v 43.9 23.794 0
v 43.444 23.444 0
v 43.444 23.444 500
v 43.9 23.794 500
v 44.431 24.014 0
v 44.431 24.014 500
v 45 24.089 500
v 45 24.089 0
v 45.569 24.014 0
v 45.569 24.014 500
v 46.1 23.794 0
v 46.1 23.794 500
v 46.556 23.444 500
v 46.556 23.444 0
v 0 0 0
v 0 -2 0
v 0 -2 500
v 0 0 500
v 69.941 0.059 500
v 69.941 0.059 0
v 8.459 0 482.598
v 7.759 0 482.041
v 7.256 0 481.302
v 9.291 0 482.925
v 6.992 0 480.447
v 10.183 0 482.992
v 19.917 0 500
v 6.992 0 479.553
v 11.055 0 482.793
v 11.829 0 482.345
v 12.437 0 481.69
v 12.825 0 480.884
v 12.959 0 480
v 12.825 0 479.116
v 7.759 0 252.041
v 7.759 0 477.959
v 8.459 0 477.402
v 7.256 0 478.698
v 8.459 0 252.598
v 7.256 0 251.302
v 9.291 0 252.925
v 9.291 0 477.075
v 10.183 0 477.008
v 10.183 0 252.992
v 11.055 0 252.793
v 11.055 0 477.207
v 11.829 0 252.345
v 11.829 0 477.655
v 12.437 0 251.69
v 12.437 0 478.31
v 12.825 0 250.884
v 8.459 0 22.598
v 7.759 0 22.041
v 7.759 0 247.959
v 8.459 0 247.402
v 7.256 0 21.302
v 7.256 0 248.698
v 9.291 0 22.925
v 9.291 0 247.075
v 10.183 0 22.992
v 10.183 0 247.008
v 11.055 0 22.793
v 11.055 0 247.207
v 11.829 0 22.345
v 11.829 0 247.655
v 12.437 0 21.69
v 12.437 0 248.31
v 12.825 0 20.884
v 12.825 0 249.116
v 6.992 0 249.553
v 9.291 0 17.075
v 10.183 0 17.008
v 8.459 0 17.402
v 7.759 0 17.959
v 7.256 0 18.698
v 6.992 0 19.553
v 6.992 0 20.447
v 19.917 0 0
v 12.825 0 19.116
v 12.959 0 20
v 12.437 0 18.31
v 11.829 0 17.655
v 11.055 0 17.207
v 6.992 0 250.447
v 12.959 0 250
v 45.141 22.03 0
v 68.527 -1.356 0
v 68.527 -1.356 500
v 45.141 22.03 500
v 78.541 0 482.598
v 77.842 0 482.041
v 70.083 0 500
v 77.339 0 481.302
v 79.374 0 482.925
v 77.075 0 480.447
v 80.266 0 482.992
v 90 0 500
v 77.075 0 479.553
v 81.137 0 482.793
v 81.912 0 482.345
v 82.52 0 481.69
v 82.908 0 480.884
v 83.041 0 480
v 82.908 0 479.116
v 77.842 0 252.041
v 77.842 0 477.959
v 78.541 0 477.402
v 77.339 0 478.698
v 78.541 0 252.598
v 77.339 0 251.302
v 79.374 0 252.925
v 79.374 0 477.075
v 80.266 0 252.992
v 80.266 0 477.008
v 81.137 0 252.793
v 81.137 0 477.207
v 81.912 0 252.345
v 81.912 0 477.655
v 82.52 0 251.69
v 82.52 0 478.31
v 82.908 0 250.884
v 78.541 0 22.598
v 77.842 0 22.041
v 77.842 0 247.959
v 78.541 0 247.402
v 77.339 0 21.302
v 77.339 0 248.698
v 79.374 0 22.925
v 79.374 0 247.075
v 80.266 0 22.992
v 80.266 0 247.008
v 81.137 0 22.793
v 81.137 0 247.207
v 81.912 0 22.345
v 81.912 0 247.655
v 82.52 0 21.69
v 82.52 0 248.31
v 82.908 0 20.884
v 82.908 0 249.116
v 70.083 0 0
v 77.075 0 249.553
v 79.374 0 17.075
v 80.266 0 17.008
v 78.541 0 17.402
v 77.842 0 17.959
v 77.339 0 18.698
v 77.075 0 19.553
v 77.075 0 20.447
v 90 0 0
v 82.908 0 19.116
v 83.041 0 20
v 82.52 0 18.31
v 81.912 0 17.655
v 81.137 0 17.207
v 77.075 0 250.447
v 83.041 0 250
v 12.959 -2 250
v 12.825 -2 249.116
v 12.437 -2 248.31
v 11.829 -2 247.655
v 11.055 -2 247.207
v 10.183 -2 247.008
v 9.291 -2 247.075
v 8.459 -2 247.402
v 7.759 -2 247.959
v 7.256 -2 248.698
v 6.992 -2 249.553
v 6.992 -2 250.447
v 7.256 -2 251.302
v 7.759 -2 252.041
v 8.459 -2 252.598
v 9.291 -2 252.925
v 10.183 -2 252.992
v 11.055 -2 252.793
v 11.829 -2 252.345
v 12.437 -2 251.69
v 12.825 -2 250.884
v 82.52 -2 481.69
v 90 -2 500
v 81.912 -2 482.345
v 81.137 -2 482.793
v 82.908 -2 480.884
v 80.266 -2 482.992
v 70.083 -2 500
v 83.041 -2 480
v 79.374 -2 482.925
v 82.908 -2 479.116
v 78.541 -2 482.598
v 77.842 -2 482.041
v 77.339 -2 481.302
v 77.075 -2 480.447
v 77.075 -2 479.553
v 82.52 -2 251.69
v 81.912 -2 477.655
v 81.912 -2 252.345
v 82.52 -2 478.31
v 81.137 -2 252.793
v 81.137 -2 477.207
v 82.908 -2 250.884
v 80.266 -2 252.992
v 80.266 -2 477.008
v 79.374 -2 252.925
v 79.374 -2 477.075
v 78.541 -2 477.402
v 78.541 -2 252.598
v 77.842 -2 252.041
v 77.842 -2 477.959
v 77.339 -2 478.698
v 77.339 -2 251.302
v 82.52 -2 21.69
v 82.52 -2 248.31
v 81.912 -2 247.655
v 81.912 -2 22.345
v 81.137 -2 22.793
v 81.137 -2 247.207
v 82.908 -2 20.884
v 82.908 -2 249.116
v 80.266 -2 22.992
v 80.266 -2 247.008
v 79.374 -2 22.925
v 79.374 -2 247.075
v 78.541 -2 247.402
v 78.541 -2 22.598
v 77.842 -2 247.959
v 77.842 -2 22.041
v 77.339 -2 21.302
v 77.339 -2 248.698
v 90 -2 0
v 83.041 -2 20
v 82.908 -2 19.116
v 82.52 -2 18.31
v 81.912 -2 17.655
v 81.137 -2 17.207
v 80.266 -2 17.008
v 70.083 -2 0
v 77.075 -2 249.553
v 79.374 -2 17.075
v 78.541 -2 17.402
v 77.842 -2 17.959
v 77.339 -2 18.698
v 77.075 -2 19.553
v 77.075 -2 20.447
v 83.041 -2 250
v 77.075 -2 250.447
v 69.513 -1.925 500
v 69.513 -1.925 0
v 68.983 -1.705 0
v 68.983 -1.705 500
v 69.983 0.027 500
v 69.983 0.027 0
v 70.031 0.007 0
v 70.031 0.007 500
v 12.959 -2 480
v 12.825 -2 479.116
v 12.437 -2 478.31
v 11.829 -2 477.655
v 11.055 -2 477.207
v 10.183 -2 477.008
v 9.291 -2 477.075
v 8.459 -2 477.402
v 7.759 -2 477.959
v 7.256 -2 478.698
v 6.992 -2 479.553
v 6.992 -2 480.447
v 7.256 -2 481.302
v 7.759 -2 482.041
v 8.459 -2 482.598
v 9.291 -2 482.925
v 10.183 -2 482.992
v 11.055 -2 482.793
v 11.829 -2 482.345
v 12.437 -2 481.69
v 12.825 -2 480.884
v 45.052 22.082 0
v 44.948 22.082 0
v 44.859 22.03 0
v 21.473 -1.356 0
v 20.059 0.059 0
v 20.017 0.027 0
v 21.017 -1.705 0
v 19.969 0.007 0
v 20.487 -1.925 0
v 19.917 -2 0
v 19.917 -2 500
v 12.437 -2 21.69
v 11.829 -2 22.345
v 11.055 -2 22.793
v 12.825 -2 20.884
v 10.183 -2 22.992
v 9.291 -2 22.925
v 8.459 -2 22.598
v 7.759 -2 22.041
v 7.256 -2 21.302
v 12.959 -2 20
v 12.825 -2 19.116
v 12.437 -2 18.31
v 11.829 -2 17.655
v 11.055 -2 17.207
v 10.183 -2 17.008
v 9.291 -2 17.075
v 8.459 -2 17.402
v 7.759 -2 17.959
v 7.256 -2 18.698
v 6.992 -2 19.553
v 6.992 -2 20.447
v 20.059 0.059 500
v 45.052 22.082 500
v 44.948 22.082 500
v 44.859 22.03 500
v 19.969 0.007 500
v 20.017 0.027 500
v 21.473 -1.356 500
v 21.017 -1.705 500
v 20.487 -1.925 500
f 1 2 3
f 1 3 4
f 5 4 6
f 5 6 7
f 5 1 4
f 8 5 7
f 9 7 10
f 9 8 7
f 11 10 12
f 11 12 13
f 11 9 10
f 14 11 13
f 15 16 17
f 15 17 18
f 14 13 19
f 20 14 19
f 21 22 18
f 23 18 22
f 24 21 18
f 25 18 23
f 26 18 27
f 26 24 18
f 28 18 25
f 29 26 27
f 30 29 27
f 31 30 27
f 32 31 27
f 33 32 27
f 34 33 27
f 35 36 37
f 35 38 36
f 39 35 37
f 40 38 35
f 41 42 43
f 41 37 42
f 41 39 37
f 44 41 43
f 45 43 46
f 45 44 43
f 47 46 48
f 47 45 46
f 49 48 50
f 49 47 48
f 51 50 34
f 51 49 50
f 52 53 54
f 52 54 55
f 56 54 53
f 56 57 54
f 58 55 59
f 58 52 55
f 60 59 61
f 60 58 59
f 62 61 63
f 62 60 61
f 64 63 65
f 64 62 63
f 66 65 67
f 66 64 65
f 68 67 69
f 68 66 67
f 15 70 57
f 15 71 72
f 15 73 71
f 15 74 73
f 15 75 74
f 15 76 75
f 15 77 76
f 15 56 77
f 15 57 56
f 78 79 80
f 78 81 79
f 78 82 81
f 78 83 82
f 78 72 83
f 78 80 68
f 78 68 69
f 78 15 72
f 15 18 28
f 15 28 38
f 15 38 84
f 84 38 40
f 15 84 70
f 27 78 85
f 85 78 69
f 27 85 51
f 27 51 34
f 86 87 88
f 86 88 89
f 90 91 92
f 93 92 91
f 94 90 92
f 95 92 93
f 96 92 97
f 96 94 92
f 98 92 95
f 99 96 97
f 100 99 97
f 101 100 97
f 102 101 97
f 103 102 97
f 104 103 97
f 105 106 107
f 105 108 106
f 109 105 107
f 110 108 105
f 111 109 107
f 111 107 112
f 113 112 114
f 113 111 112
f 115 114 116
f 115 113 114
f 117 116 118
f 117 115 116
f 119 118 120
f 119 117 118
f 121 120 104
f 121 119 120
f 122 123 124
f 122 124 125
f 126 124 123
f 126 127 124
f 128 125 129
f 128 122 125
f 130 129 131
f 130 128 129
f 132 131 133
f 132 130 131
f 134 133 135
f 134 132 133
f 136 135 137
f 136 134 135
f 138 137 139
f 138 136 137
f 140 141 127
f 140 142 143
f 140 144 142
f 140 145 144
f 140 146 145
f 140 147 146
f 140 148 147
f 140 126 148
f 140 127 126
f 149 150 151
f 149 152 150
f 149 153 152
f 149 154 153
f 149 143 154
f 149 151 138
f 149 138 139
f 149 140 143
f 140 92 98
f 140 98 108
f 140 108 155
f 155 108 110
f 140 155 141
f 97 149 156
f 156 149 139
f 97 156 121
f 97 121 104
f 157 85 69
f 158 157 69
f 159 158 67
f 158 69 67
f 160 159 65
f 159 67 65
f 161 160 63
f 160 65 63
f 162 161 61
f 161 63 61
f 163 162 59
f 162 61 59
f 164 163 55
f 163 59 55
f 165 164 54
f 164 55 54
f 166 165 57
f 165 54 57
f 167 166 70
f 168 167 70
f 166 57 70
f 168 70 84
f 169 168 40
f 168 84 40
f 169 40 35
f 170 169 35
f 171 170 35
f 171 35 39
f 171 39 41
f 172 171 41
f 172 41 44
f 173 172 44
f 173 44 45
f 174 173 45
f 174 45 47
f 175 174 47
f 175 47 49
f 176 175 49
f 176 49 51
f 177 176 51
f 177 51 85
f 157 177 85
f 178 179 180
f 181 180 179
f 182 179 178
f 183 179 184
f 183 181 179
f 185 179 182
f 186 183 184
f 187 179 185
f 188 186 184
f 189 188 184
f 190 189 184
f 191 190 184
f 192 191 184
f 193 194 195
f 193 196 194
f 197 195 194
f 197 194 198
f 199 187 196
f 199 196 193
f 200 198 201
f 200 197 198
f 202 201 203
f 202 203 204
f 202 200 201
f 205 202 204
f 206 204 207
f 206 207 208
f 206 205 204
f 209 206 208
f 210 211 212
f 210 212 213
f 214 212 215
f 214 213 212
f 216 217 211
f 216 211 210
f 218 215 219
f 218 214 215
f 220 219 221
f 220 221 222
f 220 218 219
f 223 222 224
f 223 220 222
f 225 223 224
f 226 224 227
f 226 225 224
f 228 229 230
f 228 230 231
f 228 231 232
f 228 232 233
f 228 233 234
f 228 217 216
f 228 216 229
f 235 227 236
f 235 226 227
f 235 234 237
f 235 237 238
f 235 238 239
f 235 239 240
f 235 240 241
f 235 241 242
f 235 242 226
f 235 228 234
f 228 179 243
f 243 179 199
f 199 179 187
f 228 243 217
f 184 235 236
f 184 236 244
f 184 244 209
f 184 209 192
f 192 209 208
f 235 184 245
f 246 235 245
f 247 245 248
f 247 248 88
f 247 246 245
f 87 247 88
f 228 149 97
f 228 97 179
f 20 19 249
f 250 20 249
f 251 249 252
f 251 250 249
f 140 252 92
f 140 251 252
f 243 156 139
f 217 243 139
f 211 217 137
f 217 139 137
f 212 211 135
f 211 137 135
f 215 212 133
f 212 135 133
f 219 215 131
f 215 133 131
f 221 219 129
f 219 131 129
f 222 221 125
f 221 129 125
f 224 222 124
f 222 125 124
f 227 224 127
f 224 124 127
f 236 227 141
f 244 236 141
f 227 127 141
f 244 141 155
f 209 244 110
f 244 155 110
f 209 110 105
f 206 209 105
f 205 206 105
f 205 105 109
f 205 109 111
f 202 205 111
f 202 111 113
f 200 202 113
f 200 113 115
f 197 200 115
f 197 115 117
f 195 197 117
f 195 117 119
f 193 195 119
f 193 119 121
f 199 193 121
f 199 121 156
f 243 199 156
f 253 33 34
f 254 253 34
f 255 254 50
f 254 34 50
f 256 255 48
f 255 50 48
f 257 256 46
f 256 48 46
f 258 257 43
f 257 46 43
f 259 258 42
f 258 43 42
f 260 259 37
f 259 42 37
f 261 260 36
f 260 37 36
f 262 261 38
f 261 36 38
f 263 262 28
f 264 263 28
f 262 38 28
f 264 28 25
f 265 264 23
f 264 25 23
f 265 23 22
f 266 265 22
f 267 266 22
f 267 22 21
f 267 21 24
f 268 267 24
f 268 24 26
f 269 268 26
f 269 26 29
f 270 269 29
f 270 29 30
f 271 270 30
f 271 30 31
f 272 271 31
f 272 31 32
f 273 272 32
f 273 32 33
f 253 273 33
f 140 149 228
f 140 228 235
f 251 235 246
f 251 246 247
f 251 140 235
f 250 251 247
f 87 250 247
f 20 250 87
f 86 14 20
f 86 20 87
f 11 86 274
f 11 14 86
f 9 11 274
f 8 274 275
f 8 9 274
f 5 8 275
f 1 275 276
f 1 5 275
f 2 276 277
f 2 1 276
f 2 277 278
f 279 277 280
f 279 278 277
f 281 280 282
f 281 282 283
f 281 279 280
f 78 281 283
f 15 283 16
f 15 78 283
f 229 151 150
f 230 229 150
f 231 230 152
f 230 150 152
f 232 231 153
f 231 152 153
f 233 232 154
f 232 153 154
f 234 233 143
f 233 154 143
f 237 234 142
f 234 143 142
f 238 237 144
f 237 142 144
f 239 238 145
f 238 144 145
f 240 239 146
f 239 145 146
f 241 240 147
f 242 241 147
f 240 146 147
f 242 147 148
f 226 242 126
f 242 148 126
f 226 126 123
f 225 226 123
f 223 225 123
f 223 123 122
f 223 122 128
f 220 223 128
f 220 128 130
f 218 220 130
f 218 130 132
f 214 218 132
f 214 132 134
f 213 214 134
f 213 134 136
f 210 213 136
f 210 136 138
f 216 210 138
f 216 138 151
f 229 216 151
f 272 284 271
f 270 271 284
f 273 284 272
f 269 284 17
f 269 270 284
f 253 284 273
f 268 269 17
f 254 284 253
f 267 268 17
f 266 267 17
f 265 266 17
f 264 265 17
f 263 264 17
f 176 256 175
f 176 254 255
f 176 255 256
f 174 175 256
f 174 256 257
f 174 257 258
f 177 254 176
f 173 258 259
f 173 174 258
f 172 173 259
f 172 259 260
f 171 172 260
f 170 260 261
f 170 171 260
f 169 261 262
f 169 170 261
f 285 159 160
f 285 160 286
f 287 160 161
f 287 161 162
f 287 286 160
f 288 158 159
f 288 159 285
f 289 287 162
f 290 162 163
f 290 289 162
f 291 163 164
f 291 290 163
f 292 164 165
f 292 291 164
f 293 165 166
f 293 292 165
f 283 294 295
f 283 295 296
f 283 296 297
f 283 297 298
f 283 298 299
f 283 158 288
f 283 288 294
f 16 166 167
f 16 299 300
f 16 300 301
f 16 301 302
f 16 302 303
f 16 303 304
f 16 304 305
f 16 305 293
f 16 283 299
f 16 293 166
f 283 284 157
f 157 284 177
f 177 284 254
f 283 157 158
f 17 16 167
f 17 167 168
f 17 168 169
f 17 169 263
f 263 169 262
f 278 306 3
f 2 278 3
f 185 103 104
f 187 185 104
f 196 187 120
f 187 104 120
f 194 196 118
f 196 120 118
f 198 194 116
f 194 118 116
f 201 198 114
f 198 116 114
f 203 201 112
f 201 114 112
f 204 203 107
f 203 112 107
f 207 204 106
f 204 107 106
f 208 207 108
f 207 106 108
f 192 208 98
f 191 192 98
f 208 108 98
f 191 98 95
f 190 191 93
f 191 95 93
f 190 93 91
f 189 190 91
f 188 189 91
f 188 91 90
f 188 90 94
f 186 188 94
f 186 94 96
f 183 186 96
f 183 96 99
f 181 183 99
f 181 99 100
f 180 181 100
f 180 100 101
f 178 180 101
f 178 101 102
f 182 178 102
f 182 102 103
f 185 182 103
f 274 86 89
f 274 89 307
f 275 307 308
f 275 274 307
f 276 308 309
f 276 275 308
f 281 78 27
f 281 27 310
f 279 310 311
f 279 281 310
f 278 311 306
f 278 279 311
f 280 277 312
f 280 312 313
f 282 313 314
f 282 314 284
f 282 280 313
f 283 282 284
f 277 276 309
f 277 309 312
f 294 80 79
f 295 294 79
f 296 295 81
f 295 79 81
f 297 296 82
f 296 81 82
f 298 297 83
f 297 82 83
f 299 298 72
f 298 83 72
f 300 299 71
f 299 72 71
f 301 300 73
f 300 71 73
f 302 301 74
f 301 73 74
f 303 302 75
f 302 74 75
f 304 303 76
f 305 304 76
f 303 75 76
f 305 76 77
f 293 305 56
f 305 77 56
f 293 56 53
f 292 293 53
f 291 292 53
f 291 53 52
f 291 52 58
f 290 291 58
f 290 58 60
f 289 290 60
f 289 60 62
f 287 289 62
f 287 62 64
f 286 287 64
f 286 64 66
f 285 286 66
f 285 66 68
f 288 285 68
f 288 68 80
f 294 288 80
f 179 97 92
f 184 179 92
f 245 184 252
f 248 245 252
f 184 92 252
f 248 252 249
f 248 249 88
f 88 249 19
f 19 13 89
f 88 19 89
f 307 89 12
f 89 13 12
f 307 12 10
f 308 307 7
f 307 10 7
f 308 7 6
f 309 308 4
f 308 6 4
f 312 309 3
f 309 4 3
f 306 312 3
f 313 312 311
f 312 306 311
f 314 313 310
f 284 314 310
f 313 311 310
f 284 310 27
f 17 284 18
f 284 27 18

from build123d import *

# Parameters (mm, degrees)
EXTRUDE_1_DEPTH     = 500
CUT_EXTRUDE_1_REACH = 4
SKETCH_2_R          = 3


with BuildPart() as part:
    # 草图1 → 凸台-拉伸1 (new body)
    with BuildSketch(Plane.XY):
        with BuildLine():
            Line((0, 0), (19.917157288, 0))
            ThreePointArc((19.917157288, 0), (19.993693974, 0.015224093), (20.058578644, 0.058578644))
            Line((20.058578644, 0.058578644), (43.444365081, 23.444365081))
            ThreePointArc((43.444365081, 23.444365081), (45, 24.088730163), (46.555634919, 23.444365081))
            Line((46.555634919, 23.444365081), (69.941421356, 0.058578644))
            ThreePointArc((69.941421356, 0.058578644), (70.006306026, 0.015224093), (70.082842712, 0))
            Line((70.082842712, 0), (90, 0))
            Line((90, 0), (90, -2))
            Line((90, -2), (70.082842712, -2))
            ThreePointArc((70.082842712, -2), (69.240939161, -1.832534972), (68.527207794, -1.355634919))
            Line((68.527207794, -1.355634919), (45.141421356, 22.030151519))
            ThreePointArc((45.141421356, 22.030151519), (45, 22.088730163), (44.858578644, 22.030151519))
            Line((44.858578644, 22.030151519), (21.472792206, -1.355634919))
            ThreePointArc((21.472792206, -1.355634919), (20.759060839, -1.832534972), (19.917157288, -2))
            Line((19.917157288, -2), (0, -2))
            Line((0, -2), (0, 0))
        make_face()
    extrude(amount=EXTRUDE_1_DEPTH)

    # 草图2 → 切除-拉伸1 (cut, up to next)
    with BuildSketch(Plane(origin=(0, 0, 0), x_dir=(1, 0, 0), z_dir=(0, 1, 0)), mode=Mode.PRIVATE) as cut_extrude_1_sk1:
        with Locations((9.958578644, -20)):
            Circle(SKETCH_2_R)
    cut_extrude_1_tool1 = extrude(cut_extrude_1_sk1.sketch, amount=-CUT_EXTRUDE_1_REACH, mode=Mode.PRIVATE) & part.part
    add(cut_extrude_1_tool1.solids().sort_by_distance((9.958579, 0, 20))[0], mode=Mode.SUBTRACT)
    # 草图2 → 切除-拉伸1 (cut, up to next)
    with BuildSketch(Plane(origin=(0, 0, 0), x_dir=(1, 0, 0), z_dir=(0, 1, 0)), mode=Mode.PRIVATE) as cut_extrude_1_sk2:
        with Locations((80.041421356, -20)):
            Circle(SKETCH_2_R)
    cut_extrude_1_tool2 = extrude(cut_extrude_1_sk2.sketch, amount=-CUT_EXTRUDE_1_REACH, mode=Mode.PRIVATE) & part.part
    add(cut_extrude_1_tool2.solids().sort_by_distance((80.041421, 0, 20))[0], mode=Mode.SUBTRACT)
    # 草图2 → 切除-拉伸1 (cut, up to next)
    with BuildSketch(Plane(origin=(0, 0, 0), x_dir=(1, 0, 0), z_dir=(0, 1, 0)), mode=Mode.PRIVATE) as cut_extrude_1_sk3:
        with Locations((9.958578644, -250)):
            Circle(SKETCH_2_R)
    cut_extrude_1_tool3 = extrude(cut_extrude_1_sk3.sketch, amount=-CUT_EXTRUDE_1_REACH, mode=Mode.PRIVATE) & part.part
    add(cut_extrude_1_tool3.solids().sort_by_distance((9.958579, 0, 250))[0], mode=Mode.SUBTRACT)
    # 草图2 → 切除-拉伸1 (cut, up to next)
    with BuildSketch(Plane(origin=(0, 0, 0), x_dir=(1, 0, 0), z_dir=(0, 1, 0)), mode=Mode.PRIVATE) as cut_extrude_1_sk4:
        with Locations((80.041421356, -250)):
            Circle(SKETCH_2_R)
    cut_extrude_1_tool4 = extrude(cut_extrude_1_sk4.sketch, amount=-CUT_EXTRUDE_1_REACH, mode=Mode.PRIVATE) & part.part
    add(cut_extrude_1_tool4.solids().sort_by_distance((80.041421, 0, 250))[0], mode=Mode.SUBTRACT)
    # 草图2 → 切除-拉伸1 (cut, up to next)
    with BuildSketch(Plane(origin=(0, 0, 0), x_dir=(1, 0, 0), z_dir=(0, 1, 0)), mode=Mode.PRIVATE) as cut_extrude_1_sk5:
        with Locations((9.958578644, -480)):
            Circle(SKETCH_2_R)
    cut_extrude_1_tool5 = extrude(cut_extrude_1_sk5.sketch, amount=-CUT_EXTRUDE_1_REACH, mode=Mode.PRIVATE) & part.part
    add(cut_extrude_1_tool5.solids().sort_by_distance((9.958579, 0, 480))[0], mode=Mode.SUBTRACT)
    # 草图2 → 切除-拉伸1 (cut, up to next)
    with BuildSketch(Plane(origin=(0, 0, 0), x_dir=(1, 0, 0), z_dir=(0, 1, 0)), mode=Mode.PRIVATE) as cut_extrude_1_sk6:
        with Locations((80.041421356, -480)):
            Circle(SKETCH_2_R)
    cut_extrude_1_tool6 = extrude(cut_extrude_1_sk6.sketch, amount=-CUT_EXTRUDE_1_REACH, mode=Mode.PRIVATE) & part.part
    add(cut_extrude_1_tool6.solids().sort_by_distance((80.041421, 0, 480))[0], mode=Mode.SUBTRACT)


solid = part.part
